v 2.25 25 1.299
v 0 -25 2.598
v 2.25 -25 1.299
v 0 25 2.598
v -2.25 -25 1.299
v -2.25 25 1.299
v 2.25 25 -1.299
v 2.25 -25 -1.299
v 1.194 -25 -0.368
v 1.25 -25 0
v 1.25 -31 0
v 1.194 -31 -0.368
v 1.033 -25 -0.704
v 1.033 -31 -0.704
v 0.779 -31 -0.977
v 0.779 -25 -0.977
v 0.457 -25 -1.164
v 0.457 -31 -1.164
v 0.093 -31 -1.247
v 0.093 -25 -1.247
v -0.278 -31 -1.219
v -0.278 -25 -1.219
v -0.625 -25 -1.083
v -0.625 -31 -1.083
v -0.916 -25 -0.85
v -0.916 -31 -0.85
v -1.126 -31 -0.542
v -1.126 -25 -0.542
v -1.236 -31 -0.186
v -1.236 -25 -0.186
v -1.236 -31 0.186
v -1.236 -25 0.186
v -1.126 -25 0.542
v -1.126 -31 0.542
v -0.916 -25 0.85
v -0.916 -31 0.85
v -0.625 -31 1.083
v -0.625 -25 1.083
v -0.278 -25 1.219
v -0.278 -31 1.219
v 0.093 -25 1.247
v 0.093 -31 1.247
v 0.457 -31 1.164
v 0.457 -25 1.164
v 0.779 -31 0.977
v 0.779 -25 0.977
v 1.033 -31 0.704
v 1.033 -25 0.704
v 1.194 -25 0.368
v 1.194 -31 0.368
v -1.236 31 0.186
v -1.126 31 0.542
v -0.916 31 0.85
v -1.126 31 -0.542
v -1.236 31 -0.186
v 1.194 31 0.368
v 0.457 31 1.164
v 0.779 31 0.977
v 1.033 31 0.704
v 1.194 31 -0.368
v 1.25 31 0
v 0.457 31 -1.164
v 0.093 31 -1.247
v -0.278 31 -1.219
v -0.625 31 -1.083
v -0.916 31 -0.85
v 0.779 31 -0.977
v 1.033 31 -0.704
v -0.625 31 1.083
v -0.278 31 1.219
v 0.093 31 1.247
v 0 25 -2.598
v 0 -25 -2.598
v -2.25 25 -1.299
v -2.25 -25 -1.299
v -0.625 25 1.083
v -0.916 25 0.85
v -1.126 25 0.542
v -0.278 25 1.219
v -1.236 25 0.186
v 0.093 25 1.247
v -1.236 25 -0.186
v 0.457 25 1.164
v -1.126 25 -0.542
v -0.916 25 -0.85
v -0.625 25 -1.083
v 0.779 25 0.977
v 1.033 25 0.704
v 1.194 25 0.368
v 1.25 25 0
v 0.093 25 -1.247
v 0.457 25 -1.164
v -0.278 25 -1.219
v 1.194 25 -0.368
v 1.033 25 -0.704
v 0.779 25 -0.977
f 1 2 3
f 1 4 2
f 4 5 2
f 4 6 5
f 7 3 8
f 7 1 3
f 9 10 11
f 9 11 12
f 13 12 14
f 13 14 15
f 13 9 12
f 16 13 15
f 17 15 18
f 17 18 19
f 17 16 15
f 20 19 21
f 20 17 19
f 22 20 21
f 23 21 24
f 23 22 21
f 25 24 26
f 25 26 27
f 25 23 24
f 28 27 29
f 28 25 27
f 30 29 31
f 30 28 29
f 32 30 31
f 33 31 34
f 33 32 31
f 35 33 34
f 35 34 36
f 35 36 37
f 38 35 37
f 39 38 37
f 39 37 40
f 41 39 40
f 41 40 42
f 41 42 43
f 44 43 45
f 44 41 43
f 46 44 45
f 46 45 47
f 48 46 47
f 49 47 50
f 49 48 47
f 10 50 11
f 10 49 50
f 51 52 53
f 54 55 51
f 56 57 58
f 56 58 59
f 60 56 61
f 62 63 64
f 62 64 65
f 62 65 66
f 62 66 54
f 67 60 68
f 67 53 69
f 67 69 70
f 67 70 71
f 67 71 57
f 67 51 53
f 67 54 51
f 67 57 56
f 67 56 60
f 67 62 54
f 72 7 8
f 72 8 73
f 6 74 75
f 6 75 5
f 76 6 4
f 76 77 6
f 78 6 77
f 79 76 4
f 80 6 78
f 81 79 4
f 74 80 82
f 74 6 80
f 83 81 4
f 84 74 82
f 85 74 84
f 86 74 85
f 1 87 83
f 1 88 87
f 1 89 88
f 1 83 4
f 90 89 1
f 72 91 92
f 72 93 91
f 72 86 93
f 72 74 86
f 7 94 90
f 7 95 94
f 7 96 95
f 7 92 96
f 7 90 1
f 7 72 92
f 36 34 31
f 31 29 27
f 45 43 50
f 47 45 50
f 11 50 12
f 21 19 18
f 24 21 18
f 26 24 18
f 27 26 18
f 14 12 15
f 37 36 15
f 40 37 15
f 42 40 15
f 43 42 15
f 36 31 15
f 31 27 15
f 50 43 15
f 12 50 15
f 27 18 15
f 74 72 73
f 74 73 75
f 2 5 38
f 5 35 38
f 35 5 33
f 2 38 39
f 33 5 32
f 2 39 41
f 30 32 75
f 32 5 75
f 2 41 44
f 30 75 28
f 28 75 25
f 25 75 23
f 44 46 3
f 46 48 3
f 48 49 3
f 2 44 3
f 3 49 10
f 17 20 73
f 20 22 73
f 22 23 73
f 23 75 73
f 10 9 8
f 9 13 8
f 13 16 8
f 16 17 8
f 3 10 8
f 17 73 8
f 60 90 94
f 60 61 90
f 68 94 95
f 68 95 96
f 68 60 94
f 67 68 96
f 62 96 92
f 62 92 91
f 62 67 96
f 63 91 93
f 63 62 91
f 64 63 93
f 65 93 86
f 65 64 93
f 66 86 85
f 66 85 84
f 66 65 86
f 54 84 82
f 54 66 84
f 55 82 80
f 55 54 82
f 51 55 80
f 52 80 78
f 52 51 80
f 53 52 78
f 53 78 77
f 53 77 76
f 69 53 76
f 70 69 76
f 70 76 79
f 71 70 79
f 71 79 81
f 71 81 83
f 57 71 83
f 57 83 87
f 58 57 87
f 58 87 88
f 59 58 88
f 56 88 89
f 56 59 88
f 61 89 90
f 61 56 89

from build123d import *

# Parameters (mm, degrees)
EXTRUDE_1_DEPTH = 25
SKETCH_2_R      = 1.25
EXTRUDE_2_DEPTH = 31


with BuildPart() as part:
    # 草图1 → 凸台-拉伸1 (new body, symmetric)
    with BuildSketch(Plane(origin=(0, 0, 0), x_dir=(1, 0, 0), z_dir=(0, 1, 0))):
        Polygon((2.25, -1.299038106), (2.25, 1.299038106), (0, 2.598076211), (-2.25, 1.299038106), (-2.25, -1.299038106), (0, -2.598076211), align=None)
    extrude(amount=EXTRUDE_1_DEPTH, both=True)

    # 草图2 → 凸台-拉伸2 (add, symmetric)
    with BuildSketch(Plane(origin=(0, 0, 0), x_dir=(1, 0, 0), z_dir=(0, 1, 0))):
        Circle(SKETCH_2_R)
    extrude(amount=EXTRUDE_2_DEPTH, both=True)


solid = part.part
